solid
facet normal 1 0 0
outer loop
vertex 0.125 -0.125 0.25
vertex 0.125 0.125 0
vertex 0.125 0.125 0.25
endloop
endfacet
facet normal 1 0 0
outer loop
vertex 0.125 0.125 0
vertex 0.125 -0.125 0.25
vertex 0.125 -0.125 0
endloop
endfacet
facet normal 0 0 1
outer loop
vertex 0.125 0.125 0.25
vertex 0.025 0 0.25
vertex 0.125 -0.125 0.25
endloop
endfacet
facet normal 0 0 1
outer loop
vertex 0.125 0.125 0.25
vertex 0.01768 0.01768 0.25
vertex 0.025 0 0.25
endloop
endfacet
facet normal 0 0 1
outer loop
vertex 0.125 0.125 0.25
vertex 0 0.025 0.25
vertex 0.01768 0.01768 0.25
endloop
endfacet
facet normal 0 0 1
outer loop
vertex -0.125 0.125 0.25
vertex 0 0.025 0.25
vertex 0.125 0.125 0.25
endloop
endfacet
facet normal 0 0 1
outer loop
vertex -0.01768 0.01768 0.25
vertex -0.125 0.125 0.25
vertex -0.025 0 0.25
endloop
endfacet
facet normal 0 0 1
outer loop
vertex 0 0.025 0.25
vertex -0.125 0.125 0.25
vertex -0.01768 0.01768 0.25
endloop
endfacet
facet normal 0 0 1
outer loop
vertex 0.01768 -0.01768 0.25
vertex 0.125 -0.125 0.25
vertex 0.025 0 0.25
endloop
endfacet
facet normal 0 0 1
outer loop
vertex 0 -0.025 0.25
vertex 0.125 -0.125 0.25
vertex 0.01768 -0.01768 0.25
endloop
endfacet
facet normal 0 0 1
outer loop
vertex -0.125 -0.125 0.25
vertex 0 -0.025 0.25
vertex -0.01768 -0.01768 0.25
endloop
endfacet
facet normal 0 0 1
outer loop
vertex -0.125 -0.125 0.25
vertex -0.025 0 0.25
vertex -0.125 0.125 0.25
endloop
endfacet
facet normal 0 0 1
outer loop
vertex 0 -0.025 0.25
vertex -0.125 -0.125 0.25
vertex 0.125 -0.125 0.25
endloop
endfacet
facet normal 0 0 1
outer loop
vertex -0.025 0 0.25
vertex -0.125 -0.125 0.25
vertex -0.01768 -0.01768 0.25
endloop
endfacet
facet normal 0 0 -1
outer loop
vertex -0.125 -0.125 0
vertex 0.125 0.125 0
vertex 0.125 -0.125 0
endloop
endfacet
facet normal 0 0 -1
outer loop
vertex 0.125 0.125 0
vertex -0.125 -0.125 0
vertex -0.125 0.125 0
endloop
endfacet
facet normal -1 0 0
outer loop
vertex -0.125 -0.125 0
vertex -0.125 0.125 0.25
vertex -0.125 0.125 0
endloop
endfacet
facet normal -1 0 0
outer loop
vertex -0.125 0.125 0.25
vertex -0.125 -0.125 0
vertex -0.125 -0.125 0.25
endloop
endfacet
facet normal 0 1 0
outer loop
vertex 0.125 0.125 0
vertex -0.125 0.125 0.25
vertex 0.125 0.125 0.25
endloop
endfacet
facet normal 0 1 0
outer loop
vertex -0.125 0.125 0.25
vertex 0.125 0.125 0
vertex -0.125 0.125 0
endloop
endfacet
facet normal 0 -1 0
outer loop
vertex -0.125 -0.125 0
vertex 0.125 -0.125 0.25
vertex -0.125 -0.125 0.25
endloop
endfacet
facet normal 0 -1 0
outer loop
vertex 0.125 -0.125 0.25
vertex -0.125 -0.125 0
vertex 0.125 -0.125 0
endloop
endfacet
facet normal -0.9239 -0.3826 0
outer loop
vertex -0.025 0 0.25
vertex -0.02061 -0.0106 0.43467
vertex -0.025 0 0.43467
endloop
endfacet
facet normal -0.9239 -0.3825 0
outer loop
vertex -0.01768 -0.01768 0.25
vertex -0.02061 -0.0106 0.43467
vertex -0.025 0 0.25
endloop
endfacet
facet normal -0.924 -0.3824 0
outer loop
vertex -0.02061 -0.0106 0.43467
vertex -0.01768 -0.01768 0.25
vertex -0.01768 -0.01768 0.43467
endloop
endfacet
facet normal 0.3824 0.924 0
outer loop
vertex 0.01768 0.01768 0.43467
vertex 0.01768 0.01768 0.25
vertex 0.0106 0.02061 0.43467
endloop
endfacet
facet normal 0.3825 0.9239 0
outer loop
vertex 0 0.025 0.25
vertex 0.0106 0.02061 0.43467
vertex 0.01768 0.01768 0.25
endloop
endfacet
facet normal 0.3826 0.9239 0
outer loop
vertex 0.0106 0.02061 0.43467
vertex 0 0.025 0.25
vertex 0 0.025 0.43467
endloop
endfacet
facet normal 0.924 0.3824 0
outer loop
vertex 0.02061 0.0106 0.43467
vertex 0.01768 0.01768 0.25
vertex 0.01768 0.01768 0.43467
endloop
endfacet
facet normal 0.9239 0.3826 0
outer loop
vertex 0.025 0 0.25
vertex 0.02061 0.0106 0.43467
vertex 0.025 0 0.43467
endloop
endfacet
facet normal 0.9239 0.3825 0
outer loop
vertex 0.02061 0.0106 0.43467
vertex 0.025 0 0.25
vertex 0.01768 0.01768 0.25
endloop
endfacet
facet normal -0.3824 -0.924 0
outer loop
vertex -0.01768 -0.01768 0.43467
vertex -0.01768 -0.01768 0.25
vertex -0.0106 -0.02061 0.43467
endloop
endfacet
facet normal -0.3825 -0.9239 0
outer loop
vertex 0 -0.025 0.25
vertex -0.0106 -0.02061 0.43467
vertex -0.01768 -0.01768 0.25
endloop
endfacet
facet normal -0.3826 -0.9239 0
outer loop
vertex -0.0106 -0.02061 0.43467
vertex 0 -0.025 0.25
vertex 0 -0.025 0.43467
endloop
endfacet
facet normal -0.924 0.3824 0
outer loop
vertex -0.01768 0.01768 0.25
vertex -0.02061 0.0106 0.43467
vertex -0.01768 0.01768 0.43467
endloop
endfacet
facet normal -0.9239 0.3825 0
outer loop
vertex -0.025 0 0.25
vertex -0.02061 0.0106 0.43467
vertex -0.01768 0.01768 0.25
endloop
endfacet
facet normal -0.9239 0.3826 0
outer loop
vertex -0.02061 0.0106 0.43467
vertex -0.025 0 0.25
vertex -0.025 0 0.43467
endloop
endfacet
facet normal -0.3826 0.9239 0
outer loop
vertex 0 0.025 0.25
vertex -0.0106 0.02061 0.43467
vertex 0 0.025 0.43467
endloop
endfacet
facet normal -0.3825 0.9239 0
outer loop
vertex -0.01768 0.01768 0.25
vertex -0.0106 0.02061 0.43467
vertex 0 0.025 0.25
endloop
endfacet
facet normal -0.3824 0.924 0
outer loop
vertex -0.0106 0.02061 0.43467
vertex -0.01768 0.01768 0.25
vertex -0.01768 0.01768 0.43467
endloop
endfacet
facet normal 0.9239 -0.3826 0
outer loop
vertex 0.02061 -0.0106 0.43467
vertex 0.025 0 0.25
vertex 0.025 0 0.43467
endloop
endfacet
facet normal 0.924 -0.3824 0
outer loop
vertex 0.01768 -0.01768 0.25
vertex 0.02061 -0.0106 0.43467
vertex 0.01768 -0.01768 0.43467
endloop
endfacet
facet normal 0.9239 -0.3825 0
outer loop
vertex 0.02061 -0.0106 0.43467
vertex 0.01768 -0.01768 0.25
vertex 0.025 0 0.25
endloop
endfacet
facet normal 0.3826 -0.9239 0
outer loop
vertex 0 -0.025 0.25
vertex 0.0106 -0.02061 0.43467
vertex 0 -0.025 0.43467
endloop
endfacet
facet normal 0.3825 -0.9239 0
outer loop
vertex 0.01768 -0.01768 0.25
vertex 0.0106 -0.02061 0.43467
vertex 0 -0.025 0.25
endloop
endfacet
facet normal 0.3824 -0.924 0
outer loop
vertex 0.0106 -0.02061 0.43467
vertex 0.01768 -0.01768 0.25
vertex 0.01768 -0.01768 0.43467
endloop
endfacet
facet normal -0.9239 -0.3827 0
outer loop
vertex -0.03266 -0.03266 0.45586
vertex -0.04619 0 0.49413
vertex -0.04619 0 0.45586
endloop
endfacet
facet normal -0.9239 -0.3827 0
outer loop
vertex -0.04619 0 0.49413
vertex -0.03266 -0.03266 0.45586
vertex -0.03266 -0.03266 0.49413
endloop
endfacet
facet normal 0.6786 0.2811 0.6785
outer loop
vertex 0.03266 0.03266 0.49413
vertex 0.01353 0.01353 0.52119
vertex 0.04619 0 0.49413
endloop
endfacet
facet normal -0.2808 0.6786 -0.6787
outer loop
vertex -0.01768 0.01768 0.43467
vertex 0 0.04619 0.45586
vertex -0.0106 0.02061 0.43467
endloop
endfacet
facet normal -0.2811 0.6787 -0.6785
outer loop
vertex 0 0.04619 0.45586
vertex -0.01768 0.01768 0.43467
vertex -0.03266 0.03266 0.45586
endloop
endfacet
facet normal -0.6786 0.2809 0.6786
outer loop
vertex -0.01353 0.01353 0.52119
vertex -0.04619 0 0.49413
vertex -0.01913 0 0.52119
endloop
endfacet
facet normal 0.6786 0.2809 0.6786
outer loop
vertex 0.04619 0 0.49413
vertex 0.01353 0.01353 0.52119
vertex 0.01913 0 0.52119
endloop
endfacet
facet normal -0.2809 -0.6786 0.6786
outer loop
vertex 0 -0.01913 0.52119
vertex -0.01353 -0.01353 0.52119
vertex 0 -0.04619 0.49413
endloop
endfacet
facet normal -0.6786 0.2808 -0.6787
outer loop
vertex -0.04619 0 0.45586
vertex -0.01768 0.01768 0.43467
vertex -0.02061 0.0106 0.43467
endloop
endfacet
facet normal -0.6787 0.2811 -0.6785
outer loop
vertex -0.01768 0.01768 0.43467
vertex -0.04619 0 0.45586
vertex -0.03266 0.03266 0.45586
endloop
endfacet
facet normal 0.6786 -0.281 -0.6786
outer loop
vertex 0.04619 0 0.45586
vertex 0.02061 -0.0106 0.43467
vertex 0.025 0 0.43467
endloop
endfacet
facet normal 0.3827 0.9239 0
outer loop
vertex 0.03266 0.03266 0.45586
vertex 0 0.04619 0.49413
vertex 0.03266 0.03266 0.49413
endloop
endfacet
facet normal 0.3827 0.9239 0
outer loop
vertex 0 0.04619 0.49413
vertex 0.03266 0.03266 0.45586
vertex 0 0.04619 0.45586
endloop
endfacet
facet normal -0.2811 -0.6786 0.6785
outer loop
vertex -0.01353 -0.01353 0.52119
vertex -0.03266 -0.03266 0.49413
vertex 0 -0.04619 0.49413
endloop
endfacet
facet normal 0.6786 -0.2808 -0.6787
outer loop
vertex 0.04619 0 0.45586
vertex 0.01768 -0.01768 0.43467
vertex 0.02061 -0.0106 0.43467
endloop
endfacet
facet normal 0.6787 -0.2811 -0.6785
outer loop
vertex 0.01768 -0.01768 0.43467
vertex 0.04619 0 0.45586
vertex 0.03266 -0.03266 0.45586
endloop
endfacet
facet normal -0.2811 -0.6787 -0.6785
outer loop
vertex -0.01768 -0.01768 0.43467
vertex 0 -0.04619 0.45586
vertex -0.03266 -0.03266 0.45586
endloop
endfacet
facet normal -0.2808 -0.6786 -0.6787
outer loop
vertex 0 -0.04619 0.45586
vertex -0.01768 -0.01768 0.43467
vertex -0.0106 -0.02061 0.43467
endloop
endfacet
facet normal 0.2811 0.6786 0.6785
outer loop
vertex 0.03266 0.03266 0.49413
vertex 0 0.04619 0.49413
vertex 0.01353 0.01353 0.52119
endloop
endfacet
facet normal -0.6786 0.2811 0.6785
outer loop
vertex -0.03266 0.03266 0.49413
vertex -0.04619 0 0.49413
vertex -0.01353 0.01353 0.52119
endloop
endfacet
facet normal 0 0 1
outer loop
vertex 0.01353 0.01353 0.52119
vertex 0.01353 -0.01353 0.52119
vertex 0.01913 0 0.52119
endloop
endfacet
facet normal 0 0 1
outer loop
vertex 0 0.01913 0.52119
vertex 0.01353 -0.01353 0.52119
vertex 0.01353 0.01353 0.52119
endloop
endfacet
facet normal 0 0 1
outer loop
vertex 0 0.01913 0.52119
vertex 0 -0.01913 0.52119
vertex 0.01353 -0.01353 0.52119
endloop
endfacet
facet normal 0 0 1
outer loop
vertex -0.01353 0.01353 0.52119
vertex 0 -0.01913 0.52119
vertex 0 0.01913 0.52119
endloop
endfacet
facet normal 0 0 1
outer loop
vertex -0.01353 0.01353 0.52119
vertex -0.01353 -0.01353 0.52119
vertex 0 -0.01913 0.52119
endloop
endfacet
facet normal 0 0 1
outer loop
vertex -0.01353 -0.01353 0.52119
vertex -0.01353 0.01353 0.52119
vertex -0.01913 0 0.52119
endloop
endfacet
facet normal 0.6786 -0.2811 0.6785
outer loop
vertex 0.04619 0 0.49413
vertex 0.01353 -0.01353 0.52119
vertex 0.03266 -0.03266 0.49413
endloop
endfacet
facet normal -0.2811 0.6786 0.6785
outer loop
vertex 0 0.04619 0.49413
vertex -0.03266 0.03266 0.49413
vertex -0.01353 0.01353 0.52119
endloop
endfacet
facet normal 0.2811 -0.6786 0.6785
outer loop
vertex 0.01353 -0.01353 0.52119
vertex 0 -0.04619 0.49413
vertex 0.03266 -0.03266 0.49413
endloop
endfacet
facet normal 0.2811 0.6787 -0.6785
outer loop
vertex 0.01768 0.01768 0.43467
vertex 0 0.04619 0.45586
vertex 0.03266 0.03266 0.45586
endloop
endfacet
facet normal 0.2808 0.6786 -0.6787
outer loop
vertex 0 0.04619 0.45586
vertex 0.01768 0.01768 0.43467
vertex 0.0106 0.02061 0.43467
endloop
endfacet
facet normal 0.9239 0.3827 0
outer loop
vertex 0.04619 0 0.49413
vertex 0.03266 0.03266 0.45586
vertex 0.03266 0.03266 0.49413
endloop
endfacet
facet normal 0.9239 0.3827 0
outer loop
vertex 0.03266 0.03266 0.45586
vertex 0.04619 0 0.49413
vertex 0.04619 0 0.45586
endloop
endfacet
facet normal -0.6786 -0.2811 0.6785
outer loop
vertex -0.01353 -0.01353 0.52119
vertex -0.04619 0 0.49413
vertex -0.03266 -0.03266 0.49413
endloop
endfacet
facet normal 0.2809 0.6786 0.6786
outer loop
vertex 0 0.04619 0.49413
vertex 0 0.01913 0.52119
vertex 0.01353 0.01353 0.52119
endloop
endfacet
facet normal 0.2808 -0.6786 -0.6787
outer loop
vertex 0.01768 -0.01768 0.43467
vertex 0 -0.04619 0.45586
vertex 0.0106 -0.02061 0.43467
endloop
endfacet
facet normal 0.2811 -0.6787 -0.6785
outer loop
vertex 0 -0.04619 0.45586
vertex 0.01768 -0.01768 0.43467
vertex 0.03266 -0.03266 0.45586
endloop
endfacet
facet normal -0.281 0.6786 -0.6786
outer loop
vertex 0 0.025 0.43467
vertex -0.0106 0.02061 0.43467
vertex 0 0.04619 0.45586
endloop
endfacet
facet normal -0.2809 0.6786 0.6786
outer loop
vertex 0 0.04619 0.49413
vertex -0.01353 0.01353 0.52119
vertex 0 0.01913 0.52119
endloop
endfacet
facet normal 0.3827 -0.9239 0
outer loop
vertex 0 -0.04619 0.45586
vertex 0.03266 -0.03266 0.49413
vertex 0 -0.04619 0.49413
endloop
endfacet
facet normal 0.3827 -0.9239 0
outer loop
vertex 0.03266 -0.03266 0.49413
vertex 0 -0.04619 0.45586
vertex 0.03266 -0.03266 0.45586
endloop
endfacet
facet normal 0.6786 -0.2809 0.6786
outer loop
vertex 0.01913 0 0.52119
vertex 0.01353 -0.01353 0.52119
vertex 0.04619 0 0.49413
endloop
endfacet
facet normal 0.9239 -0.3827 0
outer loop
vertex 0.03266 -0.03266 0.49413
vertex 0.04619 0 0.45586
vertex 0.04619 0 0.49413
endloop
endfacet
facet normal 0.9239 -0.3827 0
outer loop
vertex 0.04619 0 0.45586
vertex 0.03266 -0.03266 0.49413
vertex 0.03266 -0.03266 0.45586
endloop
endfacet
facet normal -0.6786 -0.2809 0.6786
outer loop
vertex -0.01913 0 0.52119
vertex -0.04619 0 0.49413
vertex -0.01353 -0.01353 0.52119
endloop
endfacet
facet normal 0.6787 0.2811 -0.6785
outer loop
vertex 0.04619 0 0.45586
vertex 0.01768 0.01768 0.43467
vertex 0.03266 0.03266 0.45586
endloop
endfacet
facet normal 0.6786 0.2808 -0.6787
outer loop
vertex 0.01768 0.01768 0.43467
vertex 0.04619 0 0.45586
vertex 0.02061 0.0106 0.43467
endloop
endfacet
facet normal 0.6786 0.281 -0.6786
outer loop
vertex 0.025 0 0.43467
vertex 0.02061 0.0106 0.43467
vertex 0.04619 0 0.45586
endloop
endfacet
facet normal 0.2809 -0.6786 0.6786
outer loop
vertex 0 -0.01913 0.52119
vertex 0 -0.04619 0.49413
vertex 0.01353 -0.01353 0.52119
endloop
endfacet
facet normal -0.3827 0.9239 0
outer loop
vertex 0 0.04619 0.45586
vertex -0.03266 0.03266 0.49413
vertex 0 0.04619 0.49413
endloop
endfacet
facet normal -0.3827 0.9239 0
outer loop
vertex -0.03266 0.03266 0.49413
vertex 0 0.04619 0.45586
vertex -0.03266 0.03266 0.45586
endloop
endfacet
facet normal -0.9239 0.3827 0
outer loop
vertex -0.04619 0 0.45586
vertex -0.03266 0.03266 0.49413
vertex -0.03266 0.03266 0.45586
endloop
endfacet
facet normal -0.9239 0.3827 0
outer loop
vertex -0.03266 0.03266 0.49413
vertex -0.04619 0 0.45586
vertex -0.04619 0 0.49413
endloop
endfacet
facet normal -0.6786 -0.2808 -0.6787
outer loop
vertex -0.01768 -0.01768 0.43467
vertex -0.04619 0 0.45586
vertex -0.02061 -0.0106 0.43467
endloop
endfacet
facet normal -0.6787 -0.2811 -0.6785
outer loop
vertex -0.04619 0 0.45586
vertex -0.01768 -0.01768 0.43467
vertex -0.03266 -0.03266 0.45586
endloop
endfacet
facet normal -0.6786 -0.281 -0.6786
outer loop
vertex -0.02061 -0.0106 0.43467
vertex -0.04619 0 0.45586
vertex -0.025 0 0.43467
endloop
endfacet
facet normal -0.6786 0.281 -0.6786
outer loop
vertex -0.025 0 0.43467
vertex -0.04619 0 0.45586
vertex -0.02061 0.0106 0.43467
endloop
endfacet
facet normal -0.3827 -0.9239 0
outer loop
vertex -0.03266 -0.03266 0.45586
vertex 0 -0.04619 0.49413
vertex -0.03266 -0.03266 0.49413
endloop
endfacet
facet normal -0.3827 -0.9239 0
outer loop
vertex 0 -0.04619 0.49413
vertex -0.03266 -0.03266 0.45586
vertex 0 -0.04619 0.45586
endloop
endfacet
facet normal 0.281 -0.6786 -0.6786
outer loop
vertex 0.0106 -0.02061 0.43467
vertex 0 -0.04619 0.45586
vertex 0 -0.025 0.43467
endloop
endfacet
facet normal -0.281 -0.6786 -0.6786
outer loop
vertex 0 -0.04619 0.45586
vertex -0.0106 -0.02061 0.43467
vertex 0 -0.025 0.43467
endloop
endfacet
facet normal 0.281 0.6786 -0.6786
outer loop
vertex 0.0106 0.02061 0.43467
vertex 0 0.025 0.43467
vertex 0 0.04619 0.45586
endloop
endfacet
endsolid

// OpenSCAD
// file: lib.scad
function x(v) = v[0];
function y(v) = v[1];
function z(v) = v[2];
function add(v1,v2) = [ for (i = [ 0 : len(v1)-1 ]) v1[i] + v2[i] ];
function xv(d) = [d,0,0];
function yv(d) = [0,d,0];
function zv(d) = [0,0,d];

module box(v) { cube(size=v, center=true); }
module cyl(r1,r2,h) { cylinder(r1=r1, r2=r2, h=h, center=true); }

function grow(n,v) = [x(v)+n*2, y(v)+n*2, z(v)+n*2];

module rbox(v, radius=1) {
	cx = x(v)/2-radius;
	cy = y(v)/2-radius;
	cz = z(v)/2-radius;

	hull() {
		translate([cx,cy,cz]) sphere(r=radius);
		translate([cx,cy,-cz]) sphere(r=radius);
		translate([cx,-cy,cz]) sphere(r=radius);
		translate([cx,-cy,-cz]) sphere(r=radius);
		translate([-cx,cy,cz]) sphere(r=radius);
		translate([-cx,cy,-cz]) sphere(r=radius);
		translate([-cx,-cy,cz]) sphere(r=radius);
		translate([-cx,-cy,-cz]) sphere(r=radius);
	}
}

module fillet(r=1) {
  minkowski() {
    difference() {
      children();
      minkowski() {
        difference() {
          minkowski() {
            children();
            sphere(r=r);
          }
          children();
        }
        sphere(r=r);
      }
    }
    sphere(r=r);
  }
}
// main file
use <lib.scad>

module base() {
	translate([0,0,0.125]) union() {
		box([0.25, 0.25, 0.25]);
		translate([0,0,0.25]) cyl(0.025, 0.025, 0.25);
		translate([0,0,0.35]) sphere(0.05);
	}
}

base($fn=8);
